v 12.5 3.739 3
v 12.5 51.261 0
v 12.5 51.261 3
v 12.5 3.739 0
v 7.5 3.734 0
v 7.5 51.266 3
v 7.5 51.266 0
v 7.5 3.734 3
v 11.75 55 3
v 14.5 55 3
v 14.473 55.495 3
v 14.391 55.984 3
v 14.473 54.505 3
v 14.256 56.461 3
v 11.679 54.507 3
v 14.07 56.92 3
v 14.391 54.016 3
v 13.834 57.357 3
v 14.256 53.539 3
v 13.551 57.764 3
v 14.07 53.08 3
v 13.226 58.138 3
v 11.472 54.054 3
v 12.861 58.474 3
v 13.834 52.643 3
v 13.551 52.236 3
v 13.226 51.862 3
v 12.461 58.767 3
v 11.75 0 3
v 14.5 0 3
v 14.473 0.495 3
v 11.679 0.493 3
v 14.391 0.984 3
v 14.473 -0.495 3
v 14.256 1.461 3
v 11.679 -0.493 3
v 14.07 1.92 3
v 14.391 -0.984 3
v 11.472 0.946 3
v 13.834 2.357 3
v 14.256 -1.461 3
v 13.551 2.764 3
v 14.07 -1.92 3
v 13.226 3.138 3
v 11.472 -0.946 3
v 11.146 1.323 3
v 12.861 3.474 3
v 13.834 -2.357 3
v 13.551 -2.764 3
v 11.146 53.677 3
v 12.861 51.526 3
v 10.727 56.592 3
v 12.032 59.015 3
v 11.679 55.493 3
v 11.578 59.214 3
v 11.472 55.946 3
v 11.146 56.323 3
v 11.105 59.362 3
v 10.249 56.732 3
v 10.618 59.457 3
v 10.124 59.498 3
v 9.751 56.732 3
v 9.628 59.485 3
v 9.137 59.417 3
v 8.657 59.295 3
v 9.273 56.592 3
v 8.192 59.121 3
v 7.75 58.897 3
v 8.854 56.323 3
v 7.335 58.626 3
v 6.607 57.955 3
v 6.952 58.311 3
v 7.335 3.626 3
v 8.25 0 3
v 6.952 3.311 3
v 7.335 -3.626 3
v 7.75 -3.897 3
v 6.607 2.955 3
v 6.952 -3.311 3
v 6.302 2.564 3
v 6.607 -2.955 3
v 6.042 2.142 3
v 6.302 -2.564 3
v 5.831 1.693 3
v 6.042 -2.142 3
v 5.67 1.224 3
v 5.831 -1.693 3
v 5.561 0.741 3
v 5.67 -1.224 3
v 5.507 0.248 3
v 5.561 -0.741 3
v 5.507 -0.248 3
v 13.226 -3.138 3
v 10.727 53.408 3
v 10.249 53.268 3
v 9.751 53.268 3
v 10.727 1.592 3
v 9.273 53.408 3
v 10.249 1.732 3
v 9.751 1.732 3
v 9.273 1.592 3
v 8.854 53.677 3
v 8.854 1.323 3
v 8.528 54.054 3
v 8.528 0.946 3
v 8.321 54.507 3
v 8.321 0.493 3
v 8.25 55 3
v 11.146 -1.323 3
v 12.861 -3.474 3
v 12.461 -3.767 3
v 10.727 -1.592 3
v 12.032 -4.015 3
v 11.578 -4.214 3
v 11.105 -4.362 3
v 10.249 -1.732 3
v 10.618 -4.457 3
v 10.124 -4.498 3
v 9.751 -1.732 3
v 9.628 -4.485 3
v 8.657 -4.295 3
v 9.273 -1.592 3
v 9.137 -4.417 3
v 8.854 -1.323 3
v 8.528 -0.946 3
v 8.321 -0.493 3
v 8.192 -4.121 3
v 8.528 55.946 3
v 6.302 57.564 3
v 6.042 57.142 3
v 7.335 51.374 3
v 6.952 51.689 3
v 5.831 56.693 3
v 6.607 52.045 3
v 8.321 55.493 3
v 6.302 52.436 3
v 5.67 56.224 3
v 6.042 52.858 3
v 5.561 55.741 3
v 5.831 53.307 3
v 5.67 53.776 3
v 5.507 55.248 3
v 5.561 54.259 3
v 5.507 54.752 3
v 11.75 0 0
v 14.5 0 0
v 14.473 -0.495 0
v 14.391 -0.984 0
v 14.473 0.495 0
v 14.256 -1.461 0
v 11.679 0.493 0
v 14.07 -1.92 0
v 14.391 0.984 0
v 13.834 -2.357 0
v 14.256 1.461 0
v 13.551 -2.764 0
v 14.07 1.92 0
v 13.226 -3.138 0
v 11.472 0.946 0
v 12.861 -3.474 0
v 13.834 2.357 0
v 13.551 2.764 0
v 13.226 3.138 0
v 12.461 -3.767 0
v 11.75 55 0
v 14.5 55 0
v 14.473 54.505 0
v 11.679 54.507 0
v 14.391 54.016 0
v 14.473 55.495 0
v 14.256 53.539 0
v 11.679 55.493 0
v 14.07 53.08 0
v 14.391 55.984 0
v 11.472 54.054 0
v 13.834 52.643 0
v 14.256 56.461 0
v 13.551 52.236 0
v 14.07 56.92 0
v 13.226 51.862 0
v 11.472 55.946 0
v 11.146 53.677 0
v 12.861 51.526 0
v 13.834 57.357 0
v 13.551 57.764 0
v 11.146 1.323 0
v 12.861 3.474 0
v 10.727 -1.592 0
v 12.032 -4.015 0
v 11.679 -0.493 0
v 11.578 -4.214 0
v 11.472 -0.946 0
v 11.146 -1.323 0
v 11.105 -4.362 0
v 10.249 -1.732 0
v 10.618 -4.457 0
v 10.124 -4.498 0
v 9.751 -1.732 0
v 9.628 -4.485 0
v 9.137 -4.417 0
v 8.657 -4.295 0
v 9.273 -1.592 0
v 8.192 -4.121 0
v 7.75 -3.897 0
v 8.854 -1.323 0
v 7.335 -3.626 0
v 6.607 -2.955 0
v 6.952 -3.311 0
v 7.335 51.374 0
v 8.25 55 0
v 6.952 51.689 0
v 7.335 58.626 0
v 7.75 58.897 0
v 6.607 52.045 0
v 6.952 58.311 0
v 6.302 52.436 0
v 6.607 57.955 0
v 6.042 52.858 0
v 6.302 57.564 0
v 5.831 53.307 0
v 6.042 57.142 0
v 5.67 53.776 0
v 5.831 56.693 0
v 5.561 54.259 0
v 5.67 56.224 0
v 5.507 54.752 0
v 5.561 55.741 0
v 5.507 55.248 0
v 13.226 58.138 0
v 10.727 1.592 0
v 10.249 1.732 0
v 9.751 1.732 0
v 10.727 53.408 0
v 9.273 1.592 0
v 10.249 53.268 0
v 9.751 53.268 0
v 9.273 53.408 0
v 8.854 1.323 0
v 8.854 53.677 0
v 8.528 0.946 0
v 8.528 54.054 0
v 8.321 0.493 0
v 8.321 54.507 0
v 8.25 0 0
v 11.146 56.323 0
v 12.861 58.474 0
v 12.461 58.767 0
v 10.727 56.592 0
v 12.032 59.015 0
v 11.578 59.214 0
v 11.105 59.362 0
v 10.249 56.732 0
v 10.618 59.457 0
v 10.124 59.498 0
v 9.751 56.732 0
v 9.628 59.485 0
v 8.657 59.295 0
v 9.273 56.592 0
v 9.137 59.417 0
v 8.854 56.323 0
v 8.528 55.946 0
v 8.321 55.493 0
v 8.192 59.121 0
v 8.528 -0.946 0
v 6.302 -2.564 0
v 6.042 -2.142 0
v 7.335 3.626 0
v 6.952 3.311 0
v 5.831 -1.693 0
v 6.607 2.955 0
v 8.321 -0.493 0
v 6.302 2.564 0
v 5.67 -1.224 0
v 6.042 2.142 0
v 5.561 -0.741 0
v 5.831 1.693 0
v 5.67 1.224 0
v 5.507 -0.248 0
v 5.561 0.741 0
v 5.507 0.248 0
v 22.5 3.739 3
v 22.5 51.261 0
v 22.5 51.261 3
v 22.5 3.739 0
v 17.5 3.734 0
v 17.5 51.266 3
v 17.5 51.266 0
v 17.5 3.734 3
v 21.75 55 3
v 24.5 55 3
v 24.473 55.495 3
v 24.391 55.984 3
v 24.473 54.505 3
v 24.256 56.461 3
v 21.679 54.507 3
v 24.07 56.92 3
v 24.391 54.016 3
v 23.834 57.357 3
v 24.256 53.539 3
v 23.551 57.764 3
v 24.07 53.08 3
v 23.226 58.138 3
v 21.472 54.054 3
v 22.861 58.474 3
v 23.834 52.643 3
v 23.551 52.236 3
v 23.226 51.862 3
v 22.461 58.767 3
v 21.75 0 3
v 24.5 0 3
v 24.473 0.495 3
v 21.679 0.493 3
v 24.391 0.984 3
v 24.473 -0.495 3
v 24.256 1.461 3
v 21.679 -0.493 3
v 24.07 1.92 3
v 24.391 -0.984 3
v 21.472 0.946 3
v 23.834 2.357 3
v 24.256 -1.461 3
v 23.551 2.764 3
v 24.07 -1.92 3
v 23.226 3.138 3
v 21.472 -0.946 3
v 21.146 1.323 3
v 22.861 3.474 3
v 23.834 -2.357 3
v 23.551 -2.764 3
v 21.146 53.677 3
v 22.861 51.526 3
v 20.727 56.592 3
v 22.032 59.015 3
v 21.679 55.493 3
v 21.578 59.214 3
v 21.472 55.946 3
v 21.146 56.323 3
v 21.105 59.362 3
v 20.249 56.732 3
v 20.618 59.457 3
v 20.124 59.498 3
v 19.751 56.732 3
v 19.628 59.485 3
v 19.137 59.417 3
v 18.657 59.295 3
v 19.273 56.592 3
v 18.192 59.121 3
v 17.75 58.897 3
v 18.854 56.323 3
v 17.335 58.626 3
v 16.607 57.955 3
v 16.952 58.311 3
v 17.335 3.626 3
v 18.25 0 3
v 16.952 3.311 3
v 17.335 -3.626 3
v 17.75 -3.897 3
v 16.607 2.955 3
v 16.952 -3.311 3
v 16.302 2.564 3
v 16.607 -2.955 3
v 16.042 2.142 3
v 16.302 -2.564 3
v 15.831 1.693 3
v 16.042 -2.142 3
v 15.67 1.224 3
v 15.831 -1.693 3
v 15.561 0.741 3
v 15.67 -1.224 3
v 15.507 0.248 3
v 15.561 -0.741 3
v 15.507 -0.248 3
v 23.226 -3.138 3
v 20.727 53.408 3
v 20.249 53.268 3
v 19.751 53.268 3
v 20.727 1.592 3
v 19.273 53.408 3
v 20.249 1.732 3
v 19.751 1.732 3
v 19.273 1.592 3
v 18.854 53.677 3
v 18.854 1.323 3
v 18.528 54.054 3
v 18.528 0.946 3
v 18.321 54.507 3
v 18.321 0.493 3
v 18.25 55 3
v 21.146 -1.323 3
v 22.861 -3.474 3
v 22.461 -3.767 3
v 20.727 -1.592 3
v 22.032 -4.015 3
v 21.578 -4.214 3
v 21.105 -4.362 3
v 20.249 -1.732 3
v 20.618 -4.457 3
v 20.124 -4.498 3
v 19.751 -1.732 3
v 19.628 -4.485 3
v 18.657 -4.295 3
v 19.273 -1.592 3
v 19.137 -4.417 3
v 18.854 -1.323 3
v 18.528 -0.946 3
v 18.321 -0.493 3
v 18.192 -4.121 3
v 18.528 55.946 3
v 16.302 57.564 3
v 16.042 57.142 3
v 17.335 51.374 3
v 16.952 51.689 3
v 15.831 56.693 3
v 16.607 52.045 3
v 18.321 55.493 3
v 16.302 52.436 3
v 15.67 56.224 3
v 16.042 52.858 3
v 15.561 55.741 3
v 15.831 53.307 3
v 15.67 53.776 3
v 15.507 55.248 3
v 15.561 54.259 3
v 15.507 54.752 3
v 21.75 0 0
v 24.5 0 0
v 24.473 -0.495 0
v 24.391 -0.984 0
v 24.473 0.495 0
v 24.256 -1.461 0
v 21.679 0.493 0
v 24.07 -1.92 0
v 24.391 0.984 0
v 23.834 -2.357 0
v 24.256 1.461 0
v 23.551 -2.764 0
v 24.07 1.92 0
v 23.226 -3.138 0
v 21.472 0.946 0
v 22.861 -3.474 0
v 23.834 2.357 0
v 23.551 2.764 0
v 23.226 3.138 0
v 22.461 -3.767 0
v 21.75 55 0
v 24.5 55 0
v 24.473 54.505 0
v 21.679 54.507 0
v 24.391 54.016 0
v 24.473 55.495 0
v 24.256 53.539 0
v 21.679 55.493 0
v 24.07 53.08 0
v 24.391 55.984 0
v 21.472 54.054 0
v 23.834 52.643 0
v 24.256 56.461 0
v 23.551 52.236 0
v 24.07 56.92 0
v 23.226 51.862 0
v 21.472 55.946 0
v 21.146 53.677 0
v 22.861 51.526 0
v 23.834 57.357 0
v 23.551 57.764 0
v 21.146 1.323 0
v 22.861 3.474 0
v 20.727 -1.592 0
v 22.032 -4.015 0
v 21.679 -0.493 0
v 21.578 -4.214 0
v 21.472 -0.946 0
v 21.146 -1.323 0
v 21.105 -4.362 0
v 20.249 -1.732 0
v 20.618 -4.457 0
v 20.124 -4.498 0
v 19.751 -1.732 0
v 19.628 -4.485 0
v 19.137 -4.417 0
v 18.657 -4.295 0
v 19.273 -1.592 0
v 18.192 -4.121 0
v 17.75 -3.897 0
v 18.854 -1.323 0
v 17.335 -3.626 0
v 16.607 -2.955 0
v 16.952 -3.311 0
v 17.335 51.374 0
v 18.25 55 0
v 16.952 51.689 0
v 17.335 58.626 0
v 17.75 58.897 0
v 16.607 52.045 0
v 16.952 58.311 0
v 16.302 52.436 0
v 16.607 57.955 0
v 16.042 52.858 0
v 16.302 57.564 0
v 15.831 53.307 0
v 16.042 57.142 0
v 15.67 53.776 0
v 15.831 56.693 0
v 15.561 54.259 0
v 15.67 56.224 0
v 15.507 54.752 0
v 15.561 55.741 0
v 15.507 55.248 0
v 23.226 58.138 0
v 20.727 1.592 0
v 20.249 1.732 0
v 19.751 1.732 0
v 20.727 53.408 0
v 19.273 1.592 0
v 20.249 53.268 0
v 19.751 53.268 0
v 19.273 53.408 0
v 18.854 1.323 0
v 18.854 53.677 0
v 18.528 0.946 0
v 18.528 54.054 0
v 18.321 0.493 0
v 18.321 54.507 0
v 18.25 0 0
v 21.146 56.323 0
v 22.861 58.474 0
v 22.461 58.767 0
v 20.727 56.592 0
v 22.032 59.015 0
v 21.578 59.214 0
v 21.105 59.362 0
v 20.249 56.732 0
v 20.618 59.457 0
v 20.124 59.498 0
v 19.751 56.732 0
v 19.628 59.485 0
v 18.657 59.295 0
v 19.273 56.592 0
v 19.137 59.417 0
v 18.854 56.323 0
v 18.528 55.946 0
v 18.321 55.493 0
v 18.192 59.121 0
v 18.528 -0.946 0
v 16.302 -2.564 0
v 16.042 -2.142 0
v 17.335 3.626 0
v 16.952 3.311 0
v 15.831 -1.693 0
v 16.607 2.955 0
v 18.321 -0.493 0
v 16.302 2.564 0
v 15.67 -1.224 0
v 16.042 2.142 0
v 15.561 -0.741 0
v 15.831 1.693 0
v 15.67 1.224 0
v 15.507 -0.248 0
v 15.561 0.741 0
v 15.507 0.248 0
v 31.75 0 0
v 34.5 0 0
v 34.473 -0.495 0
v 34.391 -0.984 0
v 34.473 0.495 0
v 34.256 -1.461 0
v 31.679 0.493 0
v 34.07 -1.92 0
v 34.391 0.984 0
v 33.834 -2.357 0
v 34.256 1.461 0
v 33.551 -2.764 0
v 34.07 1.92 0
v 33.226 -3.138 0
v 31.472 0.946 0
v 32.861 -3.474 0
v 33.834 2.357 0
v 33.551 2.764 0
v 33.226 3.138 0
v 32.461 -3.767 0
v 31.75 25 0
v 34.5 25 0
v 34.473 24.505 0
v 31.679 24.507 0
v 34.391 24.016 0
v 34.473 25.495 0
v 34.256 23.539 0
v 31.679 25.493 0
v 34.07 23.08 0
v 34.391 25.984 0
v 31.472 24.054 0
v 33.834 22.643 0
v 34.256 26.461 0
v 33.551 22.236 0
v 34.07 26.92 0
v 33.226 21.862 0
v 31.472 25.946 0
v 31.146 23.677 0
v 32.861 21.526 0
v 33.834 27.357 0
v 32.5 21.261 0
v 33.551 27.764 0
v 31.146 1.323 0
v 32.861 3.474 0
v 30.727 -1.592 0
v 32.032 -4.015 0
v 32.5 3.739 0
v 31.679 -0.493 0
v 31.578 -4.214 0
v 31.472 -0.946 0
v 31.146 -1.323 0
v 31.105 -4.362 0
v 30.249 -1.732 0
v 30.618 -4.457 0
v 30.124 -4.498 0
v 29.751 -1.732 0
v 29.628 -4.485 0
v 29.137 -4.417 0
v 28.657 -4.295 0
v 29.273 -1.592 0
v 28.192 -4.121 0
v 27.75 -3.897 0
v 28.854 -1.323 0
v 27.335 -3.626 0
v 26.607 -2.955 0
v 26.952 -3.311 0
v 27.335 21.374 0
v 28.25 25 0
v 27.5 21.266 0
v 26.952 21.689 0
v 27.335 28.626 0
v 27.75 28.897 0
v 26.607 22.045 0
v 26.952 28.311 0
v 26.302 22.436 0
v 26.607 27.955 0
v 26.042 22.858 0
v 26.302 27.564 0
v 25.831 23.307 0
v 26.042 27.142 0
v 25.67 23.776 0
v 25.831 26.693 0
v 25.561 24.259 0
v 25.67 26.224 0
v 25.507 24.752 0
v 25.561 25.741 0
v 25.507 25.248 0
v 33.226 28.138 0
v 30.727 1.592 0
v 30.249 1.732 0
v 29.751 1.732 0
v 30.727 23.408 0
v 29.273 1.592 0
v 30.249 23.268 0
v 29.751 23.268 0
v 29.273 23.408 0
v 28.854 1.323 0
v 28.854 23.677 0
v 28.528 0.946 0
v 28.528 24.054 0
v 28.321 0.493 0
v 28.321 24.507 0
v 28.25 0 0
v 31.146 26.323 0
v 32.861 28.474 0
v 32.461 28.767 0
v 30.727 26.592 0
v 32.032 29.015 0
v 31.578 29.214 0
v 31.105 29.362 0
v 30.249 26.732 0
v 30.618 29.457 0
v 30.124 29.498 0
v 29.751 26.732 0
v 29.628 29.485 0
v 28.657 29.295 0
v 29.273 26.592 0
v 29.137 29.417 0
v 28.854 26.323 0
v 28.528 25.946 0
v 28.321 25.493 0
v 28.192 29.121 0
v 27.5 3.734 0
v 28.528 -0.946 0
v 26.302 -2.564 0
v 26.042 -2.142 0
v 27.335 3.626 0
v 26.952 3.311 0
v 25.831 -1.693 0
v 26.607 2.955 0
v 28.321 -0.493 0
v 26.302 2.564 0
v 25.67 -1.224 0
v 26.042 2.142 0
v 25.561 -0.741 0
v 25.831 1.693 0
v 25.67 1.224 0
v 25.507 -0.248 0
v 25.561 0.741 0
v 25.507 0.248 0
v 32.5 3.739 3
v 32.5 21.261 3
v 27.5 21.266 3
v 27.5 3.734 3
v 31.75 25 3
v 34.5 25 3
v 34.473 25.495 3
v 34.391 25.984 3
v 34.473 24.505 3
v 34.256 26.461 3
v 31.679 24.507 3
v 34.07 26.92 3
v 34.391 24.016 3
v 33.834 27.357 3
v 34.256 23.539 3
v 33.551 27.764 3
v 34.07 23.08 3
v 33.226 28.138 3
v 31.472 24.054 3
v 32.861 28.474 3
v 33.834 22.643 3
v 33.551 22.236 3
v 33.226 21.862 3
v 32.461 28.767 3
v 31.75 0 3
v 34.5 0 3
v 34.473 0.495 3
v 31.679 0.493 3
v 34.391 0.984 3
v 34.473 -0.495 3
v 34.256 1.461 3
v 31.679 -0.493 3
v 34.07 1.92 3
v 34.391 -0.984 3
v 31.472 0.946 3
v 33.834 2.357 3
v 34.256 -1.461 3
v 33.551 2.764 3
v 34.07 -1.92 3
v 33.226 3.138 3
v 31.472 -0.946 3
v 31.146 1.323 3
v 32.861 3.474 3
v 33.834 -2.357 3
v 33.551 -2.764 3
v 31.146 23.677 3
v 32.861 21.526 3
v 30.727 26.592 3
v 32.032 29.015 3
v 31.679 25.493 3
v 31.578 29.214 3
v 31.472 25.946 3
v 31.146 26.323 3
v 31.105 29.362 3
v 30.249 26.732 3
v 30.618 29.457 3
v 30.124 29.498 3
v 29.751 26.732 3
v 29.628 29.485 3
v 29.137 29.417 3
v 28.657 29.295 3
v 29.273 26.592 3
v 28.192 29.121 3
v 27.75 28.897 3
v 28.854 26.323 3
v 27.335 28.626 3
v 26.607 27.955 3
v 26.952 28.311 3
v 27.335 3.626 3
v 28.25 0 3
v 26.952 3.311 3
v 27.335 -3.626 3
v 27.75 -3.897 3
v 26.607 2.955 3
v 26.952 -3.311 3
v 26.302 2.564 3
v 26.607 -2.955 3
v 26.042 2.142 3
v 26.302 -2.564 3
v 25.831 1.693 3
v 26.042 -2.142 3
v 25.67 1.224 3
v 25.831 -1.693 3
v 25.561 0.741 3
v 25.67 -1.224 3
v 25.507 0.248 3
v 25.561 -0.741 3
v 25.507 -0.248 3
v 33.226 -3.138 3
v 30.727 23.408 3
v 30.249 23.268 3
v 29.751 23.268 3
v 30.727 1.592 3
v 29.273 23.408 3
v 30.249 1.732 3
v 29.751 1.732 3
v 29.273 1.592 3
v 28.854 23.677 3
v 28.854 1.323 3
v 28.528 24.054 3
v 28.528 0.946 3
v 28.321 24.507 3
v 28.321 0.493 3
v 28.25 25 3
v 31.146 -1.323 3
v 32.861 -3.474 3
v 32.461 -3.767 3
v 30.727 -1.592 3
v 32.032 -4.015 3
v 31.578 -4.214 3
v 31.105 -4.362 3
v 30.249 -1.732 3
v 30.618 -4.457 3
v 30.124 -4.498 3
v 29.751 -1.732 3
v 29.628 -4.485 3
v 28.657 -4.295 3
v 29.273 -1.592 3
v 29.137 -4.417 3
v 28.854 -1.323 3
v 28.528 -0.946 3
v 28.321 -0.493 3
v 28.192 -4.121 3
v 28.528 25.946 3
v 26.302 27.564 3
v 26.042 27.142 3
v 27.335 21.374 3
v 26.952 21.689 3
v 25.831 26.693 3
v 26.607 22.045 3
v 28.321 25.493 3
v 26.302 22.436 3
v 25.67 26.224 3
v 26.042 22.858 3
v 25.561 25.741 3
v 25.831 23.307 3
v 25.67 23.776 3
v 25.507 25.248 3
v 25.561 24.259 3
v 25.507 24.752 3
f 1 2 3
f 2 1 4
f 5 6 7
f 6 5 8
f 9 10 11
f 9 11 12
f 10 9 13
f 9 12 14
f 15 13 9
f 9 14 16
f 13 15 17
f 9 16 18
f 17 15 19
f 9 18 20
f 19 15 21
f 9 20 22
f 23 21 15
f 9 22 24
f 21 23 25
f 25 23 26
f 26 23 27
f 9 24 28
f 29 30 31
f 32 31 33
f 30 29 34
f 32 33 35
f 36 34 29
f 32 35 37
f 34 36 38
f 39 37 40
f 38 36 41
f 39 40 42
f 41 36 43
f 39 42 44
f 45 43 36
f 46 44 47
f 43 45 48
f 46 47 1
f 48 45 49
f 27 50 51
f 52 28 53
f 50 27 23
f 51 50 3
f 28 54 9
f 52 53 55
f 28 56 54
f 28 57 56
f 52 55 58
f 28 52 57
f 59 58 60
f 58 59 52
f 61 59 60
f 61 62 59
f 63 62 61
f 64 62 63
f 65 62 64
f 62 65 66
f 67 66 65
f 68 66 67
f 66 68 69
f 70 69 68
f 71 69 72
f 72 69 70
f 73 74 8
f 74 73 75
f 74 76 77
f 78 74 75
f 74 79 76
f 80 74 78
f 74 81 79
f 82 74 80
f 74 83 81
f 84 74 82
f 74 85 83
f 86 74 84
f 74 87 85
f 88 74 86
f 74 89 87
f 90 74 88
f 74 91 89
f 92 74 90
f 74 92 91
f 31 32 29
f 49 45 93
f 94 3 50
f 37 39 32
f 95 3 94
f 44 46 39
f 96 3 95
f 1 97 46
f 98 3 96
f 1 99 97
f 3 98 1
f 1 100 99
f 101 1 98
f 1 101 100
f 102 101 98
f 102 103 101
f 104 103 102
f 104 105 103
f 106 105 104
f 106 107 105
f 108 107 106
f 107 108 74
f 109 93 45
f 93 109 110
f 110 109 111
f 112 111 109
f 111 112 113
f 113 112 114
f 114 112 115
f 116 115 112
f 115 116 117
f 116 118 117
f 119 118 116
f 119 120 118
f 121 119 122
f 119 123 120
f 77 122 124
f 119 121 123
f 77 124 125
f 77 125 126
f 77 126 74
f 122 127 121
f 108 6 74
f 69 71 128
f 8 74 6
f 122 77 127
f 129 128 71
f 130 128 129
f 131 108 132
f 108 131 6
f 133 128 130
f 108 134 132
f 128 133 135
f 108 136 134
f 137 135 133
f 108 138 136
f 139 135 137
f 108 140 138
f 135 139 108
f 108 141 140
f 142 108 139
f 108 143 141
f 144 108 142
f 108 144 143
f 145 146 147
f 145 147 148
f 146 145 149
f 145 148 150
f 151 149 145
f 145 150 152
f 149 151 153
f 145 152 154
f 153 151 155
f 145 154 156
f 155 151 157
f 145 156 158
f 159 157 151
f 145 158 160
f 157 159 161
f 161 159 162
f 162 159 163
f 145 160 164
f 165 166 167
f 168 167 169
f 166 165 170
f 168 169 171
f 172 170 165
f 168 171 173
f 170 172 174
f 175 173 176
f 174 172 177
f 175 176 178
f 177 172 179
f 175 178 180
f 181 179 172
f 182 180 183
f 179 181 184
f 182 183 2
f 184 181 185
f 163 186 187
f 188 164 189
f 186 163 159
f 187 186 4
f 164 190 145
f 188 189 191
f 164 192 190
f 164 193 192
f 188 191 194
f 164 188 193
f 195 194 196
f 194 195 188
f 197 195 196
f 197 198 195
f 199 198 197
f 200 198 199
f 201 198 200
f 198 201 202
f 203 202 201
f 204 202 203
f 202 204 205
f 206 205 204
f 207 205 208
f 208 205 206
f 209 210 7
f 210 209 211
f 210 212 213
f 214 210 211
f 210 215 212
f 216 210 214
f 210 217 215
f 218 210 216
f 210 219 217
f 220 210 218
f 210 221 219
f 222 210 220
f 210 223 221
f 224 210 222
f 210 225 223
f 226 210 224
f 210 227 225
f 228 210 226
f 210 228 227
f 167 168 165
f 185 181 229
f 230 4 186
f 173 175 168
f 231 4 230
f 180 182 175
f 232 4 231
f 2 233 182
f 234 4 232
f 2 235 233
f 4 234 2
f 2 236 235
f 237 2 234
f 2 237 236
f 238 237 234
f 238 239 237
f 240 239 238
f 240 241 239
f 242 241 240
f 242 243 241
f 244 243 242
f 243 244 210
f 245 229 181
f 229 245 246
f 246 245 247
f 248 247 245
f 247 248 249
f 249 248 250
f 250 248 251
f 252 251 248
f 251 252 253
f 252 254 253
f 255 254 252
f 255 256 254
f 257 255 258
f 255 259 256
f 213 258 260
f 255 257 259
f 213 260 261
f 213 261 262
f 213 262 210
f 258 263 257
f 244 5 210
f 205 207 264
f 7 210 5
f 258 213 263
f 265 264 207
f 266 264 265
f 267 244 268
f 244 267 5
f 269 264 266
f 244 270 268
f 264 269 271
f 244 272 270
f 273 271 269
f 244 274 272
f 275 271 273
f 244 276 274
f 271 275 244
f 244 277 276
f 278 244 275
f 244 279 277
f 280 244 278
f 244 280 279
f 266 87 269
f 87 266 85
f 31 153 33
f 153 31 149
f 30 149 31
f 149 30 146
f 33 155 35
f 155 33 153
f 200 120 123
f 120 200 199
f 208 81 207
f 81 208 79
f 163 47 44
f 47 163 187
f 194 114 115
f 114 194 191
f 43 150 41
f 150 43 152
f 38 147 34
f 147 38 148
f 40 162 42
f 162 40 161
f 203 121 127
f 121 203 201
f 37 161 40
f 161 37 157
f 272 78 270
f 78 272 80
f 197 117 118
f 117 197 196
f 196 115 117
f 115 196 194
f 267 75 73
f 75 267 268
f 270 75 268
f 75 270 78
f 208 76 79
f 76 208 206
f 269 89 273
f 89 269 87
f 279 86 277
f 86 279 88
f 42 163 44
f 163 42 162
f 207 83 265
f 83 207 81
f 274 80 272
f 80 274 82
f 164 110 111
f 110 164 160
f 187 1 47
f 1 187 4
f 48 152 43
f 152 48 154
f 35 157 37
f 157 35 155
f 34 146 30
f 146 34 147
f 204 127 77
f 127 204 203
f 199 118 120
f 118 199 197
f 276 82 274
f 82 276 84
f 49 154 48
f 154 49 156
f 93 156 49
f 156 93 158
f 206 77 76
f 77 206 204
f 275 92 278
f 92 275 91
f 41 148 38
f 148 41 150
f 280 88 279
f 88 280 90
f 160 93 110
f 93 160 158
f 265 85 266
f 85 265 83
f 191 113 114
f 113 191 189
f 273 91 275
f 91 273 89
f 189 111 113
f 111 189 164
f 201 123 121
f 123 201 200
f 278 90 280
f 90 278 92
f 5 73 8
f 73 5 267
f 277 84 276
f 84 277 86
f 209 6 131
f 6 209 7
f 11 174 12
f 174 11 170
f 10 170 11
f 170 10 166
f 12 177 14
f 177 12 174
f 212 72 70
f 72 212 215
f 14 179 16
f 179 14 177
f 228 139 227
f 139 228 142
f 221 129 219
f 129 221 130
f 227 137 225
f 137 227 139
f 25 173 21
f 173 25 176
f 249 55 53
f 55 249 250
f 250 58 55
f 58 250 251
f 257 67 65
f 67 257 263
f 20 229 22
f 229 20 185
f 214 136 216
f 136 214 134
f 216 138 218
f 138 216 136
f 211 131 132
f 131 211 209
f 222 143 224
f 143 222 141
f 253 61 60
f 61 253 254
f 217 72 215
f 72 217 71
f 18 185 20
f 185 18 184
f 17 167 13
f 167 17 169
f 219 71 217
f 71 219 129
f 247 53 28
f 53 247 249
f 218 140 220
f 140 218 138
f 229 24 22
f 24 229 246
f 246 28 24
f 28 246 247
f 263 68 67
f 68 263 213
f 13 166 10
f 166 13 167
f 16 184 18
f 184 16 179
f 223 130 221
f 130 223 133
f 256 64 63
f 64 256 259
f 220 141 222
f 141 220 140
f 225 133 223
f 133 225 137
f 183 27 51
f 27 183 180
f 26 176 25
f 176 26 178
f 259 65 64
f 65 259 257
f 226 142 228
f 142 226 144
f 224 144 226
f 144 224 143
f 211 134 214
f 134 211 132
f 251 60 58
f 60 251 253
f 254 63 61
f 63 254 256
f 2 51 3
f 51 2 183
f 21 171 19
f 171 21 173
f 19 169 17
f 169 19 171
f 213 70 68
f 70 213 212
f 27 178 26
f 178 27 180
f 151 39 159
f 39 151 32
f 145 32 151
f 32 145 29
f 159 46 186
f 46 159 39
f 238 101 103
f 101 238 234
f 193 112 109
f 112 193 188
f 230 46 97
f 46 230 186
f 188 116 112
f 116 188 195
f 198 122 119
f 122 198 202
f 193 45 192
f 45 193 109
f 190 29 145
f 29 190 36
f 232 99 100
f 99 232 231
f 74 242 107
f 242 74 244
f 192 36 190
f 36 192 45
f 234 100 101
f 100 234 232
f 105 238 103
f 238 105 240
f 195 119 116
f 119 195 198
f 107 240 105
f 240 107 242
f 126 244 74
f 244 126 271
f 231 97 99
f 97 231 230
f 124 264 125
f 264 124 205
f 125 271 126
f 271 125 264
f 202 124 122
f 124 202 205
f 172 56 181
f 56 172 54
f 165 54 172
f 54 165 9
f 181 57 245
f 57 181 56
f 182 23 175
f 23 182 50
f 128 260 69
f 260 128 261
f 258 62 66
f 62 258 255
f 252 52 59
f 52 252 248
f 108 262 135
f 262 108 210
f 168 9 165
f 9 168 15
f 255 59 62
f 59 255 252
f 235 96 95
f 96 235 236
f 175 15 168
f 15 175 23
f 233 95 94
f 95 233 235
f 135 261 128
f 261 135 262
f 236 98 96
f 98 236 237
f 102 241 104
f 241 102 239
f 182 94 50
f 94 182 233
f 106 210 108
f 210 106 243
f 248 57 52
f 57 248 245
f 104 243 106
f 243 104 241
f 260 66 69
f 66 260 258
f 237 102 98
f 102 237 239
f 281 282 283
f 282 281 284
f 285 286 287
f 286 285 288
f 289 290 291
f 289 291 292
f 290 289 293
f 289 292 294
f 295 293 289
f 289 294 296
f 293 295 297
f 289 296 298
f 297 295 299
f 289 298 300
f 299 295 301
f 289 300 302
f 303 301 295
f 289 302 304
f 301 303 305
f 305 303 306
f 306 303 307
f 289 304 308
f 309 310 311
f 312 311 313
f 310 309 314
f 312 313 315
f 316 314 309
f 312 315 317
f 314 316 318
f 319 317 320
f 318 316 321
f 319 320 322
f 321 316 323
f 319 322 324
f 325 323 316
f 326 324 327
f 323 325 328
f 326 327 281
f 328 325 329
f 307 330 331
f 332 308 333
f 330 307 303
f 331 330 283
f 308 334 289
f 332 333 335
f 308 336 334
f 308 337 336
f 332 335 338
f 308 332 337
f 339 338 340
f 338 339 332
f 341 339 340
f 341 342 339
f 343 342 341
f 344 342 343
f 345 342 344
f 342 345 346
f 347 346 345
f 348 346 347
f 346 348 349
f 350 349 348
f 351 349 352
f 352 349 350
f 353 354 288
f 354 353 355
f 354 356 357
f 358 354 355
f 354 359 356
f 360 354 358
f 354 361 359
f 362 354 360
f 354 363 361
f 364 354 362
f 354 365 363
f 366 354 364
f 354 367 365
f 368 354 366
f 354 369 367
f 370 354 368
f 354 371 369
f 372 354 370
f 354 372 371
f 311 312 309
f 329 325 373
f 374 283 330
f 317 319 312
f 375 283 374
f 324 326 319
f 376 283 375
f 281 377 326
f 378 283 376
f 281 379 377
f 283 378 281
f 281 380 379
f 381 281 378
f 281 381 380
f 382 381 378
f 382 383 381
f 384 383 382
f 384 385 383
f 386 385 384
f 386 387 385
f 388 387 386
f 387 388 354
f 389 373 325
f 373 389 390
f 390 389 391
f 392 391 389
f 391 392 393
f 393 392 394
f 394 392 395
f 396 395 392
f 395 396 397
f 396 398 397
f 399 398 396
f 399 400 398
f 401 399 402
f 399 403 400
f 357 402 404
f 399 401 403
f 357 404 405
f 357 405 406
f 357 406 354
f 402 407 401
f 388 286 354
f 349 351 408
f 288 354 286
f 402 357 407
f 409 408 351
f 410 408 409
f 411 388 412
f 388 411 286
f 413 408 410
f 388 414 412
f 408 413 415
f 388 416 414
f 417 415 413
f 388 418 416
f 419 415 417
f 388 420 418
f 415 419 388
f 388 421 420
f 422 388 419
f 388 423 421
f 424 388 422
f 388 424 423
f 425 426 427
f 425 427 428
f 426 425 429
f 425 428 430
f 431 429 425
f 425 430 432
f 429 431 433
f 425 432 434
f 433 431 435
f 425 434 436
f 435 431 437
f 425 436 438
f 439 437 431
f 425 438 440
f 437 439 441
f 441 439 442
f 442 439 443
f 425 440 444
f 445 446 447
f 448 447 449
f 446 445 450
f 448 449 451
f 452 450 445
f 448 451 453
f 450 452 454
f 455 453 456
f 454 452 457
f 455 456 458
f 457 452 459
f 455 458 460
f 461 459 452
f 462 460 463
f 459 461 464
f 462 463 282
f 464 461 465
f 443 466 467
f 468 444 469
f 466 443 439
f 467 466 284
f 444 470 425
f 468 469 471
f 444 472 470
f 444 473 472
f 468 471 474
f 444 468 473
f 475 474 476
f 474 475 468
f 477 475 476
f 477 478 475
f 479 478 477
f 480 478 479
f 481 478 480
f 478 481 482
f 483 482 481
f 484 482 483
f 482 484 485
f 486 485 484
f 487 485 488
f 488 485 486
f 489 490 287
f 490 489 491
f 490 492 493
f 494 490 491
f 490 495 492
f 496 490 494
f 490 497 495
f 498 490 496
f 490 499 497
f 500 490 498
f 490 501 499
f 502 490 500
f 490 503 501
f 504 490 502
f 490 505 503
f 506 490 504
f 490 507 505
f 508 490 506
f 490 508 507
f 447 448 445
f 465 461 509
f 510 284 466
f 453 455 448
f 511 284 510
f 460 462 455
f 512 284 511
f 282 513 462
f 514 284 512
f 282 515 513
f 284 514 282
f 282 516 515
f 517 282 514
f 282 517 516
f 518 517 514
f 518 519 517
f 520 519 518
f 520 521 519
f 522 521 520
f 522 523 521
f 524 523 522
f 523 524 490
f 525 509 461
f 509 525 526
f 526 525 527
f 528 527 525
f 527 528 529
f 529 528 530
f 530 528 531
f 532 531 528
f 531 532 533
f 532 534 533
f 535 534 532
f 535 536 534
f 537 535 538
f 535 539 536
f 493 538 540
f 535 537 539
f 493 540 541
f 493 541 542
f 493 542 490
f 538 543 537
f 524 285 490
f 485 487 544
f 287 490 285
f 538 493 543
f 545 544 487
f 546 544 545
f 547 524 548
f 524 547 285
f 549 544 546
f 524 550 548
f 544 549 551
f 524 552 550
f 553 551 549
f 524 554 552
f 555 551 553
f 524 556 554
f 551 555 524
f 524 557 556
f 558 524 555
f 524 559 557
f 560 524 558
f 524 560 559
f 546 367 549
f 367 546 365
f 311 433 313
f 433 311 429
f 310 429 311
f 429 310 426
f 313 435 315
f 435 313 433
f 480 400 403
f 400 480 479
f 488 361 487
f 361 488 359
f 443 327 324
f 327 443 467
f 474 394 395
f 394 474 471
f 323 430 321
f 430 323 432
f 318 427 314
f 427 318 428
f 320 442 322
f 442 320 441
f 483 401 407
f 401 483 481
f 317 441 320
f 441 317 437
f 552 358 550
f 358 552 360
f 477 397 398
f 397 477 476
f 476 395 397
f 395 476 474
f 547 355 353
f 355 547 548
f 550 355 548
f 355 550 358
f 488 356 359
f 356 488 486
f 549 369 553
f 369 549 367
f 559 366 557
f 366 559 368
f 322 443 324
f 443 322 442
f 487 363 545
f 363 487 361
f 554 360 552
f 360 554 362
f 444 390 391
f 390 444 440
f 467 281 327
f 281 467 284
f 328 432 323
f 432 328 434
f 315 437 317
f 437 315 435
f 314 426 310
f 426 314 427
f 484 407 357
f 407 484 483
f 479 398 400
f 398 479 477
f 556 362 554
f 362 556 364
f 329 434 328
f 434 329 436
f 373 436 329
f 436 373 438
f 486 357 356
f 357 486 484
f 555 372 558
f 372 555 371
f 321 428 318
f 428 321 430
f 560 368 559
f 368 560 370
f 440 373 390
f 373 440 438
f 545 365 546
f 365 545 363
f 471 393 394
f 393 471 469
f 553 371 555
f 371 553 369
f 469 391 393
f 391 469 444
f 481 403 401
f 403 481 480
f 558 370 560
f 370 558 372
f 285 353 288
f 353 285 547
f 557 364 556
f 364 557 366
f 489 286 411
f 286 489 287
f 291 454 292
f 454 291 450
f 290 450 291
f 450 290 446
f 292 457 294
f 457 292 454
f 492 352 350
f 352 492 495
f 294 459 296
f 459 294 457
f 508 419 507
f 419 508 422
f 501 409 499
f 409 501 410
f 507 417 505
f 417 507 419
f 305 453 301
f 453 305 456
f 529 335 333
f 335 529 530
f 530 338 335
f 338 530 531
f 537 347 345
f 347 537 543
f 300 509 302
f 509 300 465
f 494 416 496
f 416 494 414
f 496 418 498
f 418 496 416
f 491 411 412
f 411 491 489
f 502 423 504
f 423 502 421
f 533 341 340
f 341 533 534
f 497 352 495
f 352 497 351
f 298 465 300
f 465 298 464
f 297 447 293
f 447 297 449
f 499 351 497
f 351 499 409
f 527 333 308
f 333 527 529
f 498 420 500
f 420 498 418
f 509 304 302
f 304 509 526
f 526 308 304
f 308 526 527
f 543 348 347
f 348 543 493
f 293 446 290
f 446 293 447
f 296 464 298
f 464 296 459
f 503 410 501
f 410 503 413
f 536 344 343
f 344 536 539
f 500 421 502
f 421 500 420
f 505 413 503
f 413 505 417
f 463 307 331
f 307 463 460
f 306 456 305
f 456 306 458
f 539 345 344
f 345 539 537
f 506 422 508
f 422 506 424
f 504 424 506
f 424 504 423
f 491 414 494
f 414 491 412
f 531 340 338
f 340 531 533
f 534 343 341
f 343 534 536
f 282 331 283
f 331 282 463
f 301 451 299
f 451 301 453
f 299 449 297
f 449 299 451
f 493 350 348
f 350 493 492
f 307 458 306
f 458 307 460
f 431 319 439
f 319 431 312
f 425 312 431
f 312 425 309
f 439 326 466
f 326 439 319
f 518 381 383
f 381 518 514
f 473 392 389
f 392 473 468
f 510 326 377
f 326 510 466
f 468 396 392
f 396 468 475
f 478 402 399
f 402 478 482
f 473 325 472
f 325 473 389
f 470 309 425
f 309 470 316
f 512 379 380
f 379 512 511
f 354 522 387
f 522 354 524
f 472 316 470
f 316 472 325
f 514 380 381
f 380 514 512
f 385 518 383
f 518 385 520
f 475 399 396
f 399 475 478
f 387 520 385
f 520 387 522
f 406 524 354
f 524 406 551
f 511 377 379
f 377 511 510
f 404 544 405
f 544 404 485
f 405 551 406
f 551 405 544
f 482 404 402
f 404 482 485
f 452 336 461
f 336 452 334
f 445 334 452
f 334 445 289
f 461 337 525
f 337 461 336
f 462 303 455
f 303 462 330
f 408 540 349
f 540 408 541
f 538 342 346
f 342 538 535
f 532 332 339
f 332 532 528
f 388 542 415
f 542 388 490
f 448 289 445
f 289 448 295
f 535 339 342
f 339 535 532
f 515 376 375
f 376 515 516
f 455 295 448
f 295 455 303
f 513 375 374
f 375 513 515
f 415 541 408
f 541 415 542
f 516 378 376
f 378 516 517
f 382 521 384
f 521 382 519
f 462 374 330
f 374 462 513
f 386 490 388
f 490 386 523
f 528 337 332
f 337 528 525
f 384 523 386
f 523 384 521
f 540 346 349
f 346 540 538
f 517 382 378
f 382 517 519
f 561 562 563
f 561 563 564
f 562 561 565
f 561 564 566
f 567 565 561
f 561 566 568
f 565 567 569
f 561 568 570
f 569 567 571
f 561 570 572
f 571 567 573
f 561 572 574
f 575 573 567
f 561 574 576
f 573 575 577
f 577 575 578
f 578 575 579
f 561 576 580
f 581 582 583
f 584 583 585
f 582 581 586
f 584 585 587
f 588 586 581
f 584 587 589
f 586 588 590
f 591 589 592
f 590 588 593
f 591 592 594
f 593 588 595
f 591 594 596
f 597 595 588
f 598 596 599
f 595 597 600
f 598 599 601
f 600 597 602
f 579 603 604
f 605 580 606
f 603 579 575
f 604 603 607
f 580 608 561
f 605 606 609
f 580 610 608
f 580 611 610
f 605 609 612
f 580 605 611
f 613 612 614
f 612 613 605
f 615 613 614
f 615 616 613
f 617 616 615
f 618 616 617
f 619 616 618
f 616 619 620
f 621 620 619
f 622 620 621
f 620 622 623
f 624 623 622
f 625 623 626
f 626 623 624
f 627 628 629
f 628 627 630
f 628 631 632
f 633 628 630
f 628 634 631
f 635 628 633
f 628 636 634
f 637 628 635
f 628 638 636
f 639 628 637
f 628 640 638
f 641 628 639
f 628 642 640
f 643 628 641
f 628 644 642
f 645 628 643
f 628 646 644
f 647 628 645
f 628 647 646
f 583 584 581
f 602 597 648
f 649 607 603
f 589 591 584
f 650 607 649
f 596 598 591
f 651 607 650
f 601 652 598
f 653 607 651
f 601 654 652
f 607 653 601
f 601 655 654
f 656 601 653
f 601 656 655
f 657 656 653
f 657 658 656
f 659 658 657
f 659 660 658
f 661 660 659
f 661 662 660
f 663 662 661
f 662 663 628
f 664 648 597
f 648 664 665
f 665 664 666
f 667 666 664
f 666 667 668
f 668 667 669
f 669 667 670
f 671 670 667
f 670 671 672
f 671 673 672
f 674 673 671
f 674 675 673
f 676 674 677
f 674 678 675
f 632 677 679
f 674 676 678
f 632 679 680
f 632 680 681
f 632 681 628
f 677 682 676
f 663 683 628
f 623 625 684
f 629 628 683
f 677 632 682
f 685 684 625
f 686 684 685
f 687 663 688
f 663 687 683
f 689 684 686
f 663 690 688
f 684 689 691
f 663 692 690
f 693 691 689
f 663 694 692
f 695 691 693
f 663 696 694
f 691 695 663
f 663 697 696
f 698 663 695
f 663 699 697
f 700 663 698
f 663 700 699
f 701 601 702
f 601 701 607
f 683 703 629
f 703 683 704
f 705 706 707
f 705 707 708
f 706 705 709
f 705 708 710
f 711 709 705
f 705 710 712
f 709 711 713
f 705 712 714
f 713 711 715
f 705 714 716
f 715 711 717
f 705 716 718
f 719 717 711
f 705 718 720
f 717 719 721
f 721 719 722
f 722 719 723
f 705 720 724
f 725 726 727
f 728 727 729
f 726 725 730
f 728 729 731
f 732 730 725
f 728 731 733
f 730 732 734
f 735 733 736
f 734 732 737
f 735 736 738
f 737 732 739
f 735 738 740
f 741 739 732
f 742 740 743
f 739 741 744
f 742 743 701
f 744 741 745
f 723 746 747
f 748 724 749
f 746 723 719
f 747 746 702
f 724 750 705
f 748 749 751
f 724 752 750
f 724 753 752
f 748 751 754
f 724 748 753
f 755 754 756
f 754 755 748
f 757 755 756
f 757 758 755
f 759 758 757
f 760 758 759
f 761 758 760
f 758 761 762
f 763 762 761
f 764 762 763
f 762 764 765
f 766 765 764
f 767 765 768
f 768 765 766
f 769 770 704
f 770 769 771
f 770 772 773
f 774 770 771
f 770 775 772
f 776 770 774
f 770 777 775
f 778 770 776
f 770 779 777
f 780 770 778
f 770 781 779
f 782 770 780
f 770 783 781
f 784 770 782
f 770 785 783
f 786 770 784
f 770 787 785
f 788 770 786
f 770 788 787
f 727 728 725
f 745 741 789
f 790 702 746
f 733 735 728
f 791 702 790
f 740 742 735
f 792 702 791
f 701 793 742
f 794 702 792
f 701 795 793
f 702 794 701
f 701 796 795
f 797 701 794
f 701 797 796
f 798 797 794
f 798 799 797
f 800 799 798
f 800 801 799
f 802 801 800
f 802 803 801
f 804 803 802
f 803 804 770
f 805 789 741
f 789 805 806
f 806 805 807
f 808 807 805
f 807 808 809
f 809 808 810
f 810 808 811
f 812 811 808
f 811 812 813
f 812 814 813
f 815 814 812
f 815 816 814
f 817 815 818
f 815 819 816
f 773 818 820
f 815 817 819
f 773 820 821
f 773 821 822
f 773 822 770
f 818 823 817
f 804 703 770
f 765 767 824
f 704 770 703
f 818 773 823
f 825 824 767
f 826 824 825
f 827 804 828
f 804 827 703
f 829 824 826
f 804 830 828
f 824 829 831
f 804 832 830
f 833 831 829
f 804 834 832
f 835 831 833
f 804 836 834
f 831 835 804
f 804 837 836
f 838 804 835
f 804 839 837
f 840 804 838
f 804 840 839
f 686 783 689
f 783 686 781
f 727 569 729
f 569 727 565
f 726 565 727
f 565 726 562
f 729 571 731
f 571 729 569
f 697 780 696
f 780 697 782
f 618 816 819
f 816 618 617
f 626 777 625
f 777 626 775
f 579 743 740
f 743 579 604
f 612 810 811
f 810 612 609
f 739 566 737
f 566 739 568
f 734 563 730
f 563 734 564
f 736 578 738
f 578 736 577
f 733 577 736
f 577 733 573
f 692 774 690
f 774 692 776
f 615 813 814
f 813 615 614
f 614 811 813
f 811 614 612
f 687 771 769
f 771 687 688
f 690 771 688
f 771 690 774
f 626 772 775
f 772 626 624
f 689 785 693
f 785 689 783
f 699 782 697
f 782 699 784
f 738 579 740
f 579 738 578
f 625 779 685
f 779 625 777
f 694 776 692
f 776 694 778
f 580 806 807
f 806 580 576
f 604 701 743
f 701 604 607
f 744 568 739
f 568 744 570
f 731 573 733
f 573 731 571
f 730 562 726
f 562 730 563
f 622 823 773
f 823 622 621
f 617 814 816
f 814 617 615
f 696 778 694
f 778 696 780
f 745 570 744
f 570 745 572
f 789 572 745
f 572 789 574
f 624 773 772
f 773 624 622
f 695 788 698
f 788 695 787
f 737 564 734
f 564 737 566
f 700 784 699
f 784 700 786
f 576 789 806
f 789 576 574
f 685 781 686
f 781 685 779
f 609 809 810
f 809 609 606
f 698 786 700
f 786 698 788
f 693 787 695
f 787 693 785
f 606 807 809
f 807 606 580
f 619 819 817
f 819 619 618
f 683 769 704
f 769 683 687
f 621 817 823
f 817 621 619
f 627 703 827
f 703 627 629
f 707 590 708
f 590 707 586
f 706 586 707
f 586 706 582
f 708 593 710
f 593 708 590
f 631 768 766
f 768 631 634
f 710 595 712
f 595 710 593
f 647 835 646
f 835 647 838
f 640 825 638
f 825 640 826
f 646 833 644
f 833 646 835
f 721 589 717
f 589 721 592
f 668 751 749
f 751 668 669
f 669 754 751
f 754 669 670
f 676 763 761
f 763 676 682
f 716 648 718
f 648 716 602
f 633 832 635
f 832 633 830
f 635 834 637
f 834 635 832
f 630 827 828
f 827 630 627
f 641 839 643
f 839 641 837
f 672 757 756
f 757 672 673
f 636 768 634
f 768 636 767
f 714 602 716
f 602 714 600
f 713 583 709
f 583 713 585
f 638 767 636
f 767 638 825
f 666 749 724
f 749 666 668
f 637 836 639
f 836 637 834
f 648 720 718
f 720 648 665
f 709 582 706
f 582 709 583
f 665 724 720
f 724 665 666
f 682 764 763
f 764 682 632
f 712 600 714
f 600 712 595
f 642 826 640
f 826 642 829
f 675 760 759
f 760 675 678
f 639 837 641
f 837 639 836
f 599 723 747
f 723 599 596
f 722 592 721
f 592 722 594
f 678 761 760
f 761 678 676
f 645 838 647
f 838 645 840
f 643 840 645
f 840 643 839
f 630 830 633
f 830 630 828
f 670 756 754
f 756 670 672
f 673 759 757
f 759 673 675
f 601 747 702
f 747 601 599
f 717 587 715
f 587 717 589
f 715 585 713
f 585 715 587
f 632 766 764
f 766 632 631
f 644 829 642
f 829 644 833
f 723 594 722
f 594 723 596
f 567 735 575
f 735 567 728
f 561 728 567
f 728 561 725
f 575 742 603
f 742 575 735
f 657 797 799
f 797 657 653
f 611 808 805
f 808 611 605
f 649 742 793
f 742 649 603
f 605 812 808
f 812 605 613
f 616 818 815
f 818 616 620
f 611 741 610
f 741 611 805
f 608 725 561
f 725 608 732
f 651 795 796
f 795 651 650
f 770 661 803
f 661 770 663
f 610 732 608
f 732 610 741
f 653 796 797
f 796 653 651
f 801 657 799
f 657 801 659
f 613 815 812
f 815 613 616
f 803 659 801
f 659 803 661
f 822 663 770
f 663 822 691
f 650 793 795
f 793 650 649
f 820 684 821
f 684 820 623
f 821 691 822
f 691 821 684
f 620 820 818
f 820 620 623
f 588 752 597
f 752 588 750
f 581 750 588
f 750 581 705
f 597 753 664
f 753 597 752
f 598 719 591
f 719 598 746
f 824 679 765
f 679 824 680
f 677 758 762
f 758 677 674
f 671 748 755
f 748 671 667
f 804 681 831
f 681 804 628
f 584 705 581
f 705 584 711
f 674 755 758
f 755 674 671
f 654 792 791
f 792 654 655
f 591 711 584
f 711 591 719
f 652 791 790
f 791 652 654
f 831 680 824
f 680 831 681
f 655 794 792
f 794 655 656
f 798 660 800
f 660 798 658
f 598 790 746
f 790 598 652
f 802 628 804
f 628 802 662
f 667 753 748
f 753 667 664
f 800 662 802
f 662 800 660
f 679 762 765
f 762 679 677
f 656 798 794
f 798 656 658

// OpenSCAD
// Created by Bengt "condac" for the OpenRC Tractor

$fa=0.1;
$fs=0.5;
C_M3_DIAMETER = 3.5;

link_h = 3;
link_d = 5;

mount_d= 9;
mount_h = 3;
mount_hole = 3.3;

//steering_link_twisted(link_length = 50);
//translate([10,0,0]) steering_link_twisted(link_length = 60);

translate([10,0,0]) custom_link(link_length = 55);
translate([20,0,0]) custom_link(link_length = 55);
translate([30,0,0]) custom_link(link_length = 25);

module steering_link_twisted(link_length = 51) {
    difference() {
        union() {
            hull() {
                translate([0, 0, 0])cylinder(d=link_d, h=link_h);
                translate([0, link_length/2, 0])  cylinder(d=link_d, h=link_h);
            }
            hull() {
                translate([0, link_length, link_d/2]) rotate([0,90,0])  cylinder(d=link_d, h=link_h);
                translate([0, link_length/2, 0])  cylinder(d=link_d, h=link_h);
            }

            
            translate([0, 0, 0]) cylinder(d=mount_d, h=mount_h);
            translate([0, link_length, mount_d/2]) rotate([0,90,0]) cylinder(d=mount_d, h=mount_h);
        }
        allScrews_twisted(link_l = link_length);
    }
}

%allScrews();
module allScrews_twisted(link_l =51) {

            translate([0, 0, 0]) cylinder(d=C_M3_DIAMETER, h=mount_h);
            translate([-mount_h, link_l, mount_d/2]) rotate([0,90,0]) cylinder(d=C_M3_DIAMETER, h=mount_h*5);
}
module allScrews(link_l =51) {

            translate([0, 0, 0]) cylinder(d=C_M3_DIAMETER, h=mount_h);
            translate([0, link_l, 0]) cylinder(d=C_M3_DIAMETER, h=mount_h*5);
}

module custom_link(link_length = 51) {
    difference() {
        union() {
            hull() {
                translate([0, 0, 0])cylinder(d=link_d, h=link_h);
                translate([0, link_length/2, 0])  cylinder(d=link_d, h=link_h);
            }
            hull() {
                translate([0, link_length, 0]) cylinder(d=link_d, h=link_h);
                translate([0, link_length/2, 0])  cylinder(d=link_d, h=link_h);
            }

            
            translate([0, 0, 0]) cylinder(d=mount_d, h=mount_h);
            translate([0, link_length, ]) cylinder(d=mount_d, h=mount_h);
        }
        allScrews(link_l = link_length);
    }
}
